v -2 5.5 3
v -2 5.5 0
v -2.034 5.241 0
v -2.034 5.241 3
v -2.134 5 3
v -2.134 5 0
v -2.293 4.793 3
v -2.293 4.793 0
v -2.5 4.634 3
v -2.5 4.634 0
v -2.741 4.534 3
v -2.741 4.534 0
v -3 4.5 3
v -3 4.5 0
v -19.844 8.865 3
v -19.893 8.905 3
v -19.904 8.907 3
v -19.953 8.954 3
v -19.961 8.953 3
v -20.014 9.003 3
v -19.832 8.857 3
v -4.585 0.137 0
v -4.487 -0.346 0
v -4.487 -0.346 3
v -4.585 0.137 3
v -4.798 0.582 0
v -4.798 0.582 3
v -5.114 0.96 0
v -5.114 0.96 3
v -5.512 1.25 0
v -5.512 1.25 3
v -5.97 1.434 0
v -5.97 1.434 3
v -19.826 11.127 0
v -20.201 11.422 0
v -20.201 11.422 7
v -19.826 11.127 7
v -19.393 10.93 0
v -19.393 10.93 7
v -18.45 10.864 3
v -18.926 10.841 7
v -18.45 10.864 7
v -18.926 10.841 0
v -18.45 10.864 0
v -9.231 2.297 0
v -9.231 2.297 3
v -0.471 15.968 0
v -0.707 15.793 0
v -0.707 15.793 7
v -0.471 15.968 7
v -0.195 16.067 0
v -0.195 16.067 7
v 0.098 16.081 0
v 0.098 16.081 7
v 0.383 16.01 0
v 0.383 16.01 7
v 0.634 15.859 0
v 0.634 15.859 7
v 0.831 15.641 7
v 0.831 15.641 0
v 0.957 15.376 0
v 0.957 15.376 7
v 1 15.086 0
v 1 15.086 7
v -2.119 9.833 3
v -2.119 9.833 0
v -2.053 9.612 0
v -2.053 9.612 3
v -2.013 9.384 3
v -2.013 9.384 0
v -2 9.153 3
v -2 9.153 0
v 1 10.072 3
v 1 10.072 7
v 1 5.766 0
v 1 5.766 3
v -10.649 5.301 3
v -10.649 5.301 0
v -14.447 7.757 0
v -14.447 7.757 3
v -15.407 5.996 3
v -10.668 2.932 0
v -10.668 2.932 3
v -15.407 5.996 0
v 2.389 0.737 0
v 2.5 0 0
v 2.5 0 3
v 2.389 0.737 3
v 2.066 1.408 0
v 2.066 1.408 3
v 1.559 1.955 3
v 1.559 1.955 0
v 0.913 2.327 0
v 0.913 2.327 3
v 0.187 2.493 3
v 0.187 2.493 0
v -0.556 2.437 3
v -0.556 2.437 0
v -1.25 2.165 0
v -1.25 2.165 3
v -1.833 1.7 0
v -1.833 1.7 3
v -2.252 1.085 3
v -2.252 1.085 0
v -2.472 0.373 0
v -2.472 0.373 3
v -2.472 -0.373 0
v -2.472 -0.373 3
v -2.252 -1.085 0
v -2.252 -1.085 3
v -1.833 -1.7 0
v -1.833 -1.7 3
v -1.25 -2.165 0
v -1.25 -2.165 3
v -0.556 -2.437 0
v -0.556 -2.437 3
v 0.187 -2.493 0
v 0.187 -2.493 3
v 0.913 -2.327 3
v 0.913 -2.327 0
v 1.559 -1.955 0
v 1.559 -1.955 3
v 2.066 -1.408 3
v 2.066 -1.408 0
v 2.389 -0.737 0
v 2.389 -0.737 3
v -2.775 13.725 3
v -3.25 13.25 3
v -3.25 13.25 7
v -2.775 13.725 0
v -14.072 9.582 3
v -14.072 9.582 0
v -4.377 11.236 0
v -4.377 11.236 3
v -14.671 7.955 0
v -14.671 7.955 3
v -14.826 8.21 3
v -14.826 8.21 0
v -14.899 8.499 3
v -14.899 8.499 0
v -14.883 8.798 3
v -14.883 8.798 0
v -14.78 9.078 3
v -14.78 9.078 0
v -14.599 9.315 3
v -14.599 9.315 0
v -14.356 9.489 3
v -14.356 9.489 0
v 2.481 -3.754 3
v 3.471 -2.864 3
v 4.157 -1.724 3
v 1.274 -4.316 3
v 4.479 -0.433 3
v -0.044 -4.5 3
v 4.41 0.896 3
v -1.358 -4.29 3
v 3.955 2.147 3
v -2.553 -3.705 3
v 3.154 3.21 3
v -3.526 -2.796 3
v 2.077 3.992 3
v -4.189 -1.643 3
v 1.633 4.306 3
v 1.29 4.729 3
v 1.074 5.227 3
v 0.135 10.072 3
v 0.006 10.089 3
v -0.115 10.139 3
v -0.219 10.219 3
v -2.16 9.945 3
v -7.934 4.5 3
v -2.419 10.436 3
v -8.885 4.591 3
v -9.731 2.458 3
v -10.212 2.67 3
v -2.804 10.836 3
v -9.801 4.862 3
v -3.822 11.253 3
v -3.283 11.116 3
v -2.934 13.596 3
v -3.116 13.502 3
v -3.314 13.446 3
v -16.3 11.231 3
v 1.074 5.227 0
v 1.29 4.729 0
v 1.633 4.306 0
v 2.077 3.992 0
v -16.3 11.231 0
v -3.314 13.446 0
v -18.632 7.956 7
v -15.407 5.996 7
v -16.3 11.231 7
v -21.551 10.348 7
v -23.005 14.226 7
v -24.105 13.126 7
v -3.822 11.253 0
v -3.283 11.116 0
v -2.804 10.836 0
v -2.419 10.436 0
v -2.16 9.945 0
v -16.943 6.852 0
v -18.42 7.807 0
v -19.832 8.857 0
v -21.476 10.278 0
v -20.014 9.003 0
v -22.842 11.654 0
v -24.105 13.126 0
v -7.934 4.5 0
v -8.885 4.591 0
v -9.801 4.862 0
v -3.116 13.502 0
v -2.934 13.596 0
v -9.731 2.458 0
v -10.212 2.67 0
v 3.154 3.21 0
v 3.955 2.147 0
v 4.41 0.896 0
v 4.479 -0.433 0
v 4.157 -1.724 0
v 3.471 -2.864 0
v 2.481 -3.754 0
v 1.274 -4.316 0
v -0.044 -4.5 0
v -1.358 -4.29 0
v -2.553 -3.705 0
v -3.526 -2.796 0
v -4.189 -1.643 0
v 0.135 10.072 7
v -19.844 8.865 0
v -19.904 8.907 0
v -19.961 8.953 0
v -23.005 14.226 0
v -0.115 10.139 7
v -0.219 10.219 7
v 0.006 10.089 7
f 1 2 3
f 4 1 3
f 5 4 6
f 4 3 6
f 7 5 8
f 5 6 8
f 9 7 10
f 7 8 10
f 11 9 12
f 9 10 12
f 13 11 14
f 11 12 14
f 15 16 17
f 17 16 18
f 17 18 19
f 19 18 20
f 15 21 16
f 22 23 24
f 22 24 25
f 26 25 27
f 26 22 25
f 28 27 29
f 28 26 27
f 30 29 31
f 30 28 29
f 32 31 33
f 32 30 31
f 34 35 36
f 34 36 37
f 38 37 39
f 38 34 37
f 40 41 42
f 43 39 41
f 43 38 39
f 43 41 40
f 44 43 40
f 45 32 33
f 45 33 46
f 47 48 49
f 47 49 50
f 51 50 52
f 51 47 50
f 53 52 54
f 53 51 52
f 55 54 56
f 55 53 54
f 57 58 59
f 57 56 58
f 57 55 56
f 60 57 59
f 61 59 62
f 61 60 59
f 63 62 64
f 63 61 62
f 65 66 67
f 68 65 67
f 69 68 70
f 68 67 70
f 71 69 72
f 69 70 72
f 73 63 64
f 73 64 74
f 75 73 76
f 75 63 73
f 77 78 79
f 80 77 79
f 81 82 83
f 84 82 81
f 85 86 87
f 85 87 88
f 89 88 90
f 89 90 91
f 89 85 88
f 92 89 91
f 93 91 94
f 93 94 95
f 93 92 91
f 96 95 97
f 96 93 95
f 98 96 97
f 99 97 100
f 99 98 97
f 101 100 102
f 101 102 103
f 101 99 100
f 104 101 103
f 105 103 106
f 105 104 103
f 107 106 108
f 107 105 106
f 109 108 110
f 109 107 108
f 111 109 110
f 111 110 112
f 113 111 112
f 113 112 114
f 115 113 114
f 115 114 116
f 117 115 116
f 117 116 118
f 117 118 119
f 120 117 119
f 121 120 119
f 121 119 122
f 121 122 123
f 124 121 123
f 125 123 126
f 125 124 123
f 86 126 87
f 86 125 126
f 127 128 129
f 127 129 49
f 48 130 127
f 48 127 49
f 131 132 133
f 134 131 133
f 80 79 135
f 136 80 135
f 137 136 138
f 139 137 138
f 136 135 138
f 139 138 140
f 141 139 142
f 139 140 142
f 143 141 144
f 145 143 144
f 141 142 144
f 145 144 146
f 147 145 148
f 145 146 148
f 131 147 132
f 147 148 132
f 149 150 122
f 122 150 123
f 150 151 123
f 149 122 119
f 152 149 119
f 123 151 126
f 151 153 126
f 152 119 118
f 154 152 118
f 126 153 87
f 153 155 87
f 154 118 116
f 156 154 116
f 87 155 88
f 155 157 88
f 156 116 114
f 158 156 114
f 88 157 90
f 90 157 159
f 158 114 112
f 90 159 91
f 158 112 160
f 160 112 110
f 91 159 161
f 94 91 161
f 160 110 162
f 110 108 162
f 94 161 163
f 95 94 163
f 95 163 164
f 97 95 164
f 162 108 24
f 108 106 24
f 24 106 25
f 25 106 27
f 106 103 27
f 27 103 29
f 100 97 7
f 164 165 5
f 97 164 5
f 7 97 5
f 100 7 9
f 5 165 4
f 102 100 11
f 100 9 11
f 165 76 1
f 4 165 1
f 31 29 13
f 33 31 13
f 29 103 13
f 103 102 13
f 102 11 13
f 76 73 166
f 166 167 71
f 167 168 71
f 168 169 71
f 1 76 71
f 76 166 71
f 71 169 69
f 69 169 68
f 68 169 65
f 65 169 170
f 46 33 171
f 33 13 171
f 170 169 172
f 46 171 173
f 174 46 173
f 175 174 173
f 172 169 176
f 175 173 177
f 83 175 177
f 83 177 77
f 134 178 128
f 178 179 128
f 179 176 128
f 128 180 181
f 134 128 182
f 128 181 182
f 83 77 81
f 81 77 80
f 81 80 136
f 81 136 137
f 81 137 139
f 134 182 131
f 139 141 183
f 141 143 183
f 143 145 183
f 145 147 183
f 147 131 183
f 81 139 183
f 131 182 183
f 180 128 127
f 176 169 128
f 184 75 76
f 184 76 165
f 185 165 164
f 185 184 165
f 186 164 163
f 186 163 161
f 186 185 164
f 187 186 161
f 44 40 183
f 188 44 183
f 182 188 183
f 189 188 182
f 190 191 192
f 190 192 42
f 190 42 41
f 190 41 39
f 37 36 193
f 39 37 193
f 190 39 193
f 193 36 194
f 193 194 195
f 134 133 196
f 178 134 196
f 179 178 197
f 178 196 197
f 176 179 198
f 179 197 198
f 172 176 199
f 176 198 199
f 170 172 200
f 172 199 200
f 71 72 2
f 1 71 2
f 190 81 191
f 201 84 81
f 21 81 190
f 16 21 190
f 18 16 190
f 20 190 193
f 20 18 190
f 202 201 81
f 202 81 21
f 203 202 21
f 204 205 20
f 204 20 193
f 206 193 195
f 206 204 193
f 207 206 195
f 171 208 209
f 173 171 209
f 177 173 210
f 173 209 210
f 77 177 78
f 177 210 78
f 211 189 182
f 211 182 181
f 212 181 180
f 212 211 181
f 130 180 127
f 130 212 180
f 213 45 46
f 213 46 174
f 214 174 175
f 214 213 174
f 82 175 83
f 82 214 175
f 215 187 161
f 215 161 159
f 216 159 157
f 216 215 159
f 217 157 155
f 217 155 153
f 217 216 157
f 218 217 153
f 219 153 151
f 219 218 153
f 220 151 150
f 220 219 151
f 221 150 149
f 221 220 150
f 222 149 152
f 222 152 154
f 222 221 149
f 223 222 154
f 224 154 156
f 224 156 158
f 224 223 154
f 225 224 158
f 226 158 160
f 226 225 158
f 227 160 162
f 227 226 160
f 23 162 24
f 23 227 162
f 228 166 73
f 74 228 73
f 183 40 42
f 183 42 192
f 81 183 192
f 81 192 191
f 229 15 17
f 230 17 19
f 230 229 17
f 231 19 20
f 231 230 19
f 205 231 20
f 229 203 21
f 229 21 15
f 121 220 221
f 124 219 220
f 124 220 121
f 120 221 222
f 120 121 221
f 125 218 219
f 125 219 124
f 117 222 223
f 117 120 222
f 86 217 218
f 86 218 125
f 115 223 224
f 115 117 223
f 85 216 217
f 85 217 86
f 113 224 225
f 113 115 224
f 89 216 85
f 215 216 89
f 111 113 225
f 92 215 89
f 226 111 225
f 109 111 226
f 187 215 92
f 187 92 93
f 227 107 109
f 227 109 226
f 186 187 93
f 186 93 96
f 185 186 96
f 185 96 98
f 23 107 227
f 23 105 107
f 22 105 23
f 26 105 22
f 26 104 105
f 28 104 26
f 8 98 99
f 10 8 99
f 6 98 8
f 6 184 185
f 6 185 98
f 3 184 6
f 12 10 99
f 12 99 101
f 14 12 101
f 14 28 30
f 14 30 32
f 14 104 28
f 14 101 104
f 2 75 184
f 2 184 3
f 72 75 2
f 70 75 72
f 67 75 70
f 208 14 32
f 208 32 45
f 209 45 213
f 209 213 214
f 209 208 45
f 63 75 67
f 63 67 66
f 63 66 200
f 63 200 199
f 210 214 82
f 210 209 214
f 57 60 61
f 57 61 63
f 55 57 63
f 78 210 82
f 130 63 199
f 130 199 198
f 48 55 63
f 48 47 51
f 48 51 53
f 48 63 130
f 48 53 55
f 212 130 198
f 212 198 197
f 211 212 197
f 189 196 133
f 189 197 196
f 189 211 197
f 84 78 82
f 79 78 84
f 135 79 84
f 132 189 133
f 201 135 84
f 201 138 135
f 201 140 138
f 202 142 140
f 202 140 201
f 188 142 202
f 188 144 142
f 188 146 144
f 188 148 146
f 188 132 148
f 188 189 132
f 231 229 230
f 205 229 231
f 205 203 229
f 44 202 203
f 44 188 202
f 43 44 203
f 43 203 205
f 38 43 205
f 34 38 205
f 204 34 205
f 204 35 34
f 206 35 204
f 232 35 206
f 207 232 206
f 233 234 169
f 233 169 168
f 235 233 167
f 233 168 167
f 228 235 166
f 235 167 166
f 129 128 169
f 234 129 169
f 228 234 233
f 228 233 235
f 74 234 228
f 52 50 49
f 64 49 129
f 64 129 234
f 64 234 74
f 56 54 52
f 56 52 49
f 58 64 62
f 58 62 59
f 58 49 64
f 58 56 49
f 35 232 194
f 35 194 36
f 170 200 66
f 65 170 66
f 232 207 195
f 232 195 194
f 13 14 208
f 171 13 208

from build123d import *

# Parameters (mm, degrees)
ESQUISSE1_R          = 2.5
BASE_EXTRUSION_DEPTH = 3
BOSS_EXTRU_1_DEPTH   = 7


with BuildPart() as part:
    # Esquisse1 → Base-Extrusion (new body)
    with BuildSketch(Plane.XY):
        with BuildLine():
            Line((-10.667800722, 2.931775933), (-19.844250261, 8.864938219))
            ThreePointArc((-19.844250261, 8.864938219), (-20.280859603, 9.905812475), (-19.469453705, 10.690457238))
            Line((-19.469453705, 10.690457238), (-3.313828745, 13.446463599))
            ThreePointArc((-3.313828745, 13.446463599), (-3.022713301, 13.543930034), (-2.774883777, 13.725116223))
            Line((-2.774883777, 13.725116223), (-0.707106781, 15.792893219))
            ThreePointArc((-0.707106781, 15.792893219), (0.382683432, 16.00966597), (1, 15.085786438))
            Line((1, 15.085786438), (1, 5.766281297))
            ThreePointArc((1, 5.766281297), (1.290299171, 4.728532254), (2.076923077, 3.992040898))
            ThreePointArc((2.076923077, 3.992040898), (2.481066389, -3.75423888), (-4.486704107, -0.345667841))
            ThreePointArc((-4.486704107, -0.345667841), (-4.944162699, 0.780843297), (-5.969520458, 1.434247592))
            Line((-5.969520458, 1.434247592), (-9.231194787, 2.296710044))
            ThreePointArc((-9.231194787, 2.296710044), (-9.974591181, 2.557478226), (-10.667800722, 2.931775933))
        make_face()
        Circle(ESQUISSE1_R, mode=Mode.SUBTRACT)
        with BuildLine():
            Line((-2, 9.15321079), (-2, 5.5))
            ThreePointArc((-2, 5.5), (-2.292893219, 4.792893219), (-3, 4.5))
            Line((-3, 4.5), (-7.934127615, 4.5))
            ThreePointArc((-7.934127615, 4.5), (-9.349403144, 4.704481761), (-10.648919459, 5.301201929))
            Line((-10.648919459, 5.301201929), (-14.446834044, 7.756796926))
            ThreePointArc((-14.446834044, 7.756796926), (-14.883443387, 8.797671182), (-14.072037489, 9.582315945))
            Line((-14.072037489, 9.582315945), (-4.37665324, 11.236262526))
            ThreePointArc((-4.37665324, 11.236262526), (-3.033695989, 10.992947624), (-2.159511991, 9.944835677))
            Line((-2.159511991, 9.944835677), (-2.119182379, 9.833302751))
            ThreePointArc((-2.119182379, 9.833302751), (-2.030020908, 9.4984388), (-2, 9.15321079))
        make_face(mode=Mode.SUBTRACT)
    extrude(amount=BASE_EXTRUSION_DEPTH)

    # Esquisse2 → Boss.-Extru.1 (add)
    with BuildSketch(Plane(origin=(0, 0, 0), x_dir=(-1, 0, 0), z_dir=(0, 0, -1))):
        with BuildLine():
            Line((0.707106781, 15.792893219), (3.25, 13.25))
            Line((3.25, 13.25), (0.218577995, 10.218577995))
            ThreePointArc((0.218577995, 10.218577995), (0.056366321, 10.110191619), (-0.134975396, 10.072131386))
            Line((-0.134975396, 10.072131386), (-1, 10.072131386))
            Line((-1, 10.072131386), (-1, 15.085786438))
            ThreePointArc((-1, 15.085786438), (-0.382683432, 16.00966597), (0.707106781, 15.792893219))
        make_face()
        with BuildLine():
            Line((16.3, 11.231137936), (15.406918032, 5.995918767))
            ThreePointArc((15.406918032, 5.995918767), (20.133394575, 9.10050758), (24.105145399, 13.125833357))
            Line((24.105145399, 13.125833357), (23.004987611, 14.225991144))
            Line((23.004987611, 14.225991144), (20.200649548, 11.421653081))
            ThreePointArc((20.200649548, 11.421653081), (19.393155824, 10.930114551), (18.450112359, 10.864347833))
            Line((18.450112359, 10.864347833), (16.3, 11.231137936))
        make_face()
    extrude(amount=-BOSS_EXTRU_1_DEPTH)


solid = part.part
